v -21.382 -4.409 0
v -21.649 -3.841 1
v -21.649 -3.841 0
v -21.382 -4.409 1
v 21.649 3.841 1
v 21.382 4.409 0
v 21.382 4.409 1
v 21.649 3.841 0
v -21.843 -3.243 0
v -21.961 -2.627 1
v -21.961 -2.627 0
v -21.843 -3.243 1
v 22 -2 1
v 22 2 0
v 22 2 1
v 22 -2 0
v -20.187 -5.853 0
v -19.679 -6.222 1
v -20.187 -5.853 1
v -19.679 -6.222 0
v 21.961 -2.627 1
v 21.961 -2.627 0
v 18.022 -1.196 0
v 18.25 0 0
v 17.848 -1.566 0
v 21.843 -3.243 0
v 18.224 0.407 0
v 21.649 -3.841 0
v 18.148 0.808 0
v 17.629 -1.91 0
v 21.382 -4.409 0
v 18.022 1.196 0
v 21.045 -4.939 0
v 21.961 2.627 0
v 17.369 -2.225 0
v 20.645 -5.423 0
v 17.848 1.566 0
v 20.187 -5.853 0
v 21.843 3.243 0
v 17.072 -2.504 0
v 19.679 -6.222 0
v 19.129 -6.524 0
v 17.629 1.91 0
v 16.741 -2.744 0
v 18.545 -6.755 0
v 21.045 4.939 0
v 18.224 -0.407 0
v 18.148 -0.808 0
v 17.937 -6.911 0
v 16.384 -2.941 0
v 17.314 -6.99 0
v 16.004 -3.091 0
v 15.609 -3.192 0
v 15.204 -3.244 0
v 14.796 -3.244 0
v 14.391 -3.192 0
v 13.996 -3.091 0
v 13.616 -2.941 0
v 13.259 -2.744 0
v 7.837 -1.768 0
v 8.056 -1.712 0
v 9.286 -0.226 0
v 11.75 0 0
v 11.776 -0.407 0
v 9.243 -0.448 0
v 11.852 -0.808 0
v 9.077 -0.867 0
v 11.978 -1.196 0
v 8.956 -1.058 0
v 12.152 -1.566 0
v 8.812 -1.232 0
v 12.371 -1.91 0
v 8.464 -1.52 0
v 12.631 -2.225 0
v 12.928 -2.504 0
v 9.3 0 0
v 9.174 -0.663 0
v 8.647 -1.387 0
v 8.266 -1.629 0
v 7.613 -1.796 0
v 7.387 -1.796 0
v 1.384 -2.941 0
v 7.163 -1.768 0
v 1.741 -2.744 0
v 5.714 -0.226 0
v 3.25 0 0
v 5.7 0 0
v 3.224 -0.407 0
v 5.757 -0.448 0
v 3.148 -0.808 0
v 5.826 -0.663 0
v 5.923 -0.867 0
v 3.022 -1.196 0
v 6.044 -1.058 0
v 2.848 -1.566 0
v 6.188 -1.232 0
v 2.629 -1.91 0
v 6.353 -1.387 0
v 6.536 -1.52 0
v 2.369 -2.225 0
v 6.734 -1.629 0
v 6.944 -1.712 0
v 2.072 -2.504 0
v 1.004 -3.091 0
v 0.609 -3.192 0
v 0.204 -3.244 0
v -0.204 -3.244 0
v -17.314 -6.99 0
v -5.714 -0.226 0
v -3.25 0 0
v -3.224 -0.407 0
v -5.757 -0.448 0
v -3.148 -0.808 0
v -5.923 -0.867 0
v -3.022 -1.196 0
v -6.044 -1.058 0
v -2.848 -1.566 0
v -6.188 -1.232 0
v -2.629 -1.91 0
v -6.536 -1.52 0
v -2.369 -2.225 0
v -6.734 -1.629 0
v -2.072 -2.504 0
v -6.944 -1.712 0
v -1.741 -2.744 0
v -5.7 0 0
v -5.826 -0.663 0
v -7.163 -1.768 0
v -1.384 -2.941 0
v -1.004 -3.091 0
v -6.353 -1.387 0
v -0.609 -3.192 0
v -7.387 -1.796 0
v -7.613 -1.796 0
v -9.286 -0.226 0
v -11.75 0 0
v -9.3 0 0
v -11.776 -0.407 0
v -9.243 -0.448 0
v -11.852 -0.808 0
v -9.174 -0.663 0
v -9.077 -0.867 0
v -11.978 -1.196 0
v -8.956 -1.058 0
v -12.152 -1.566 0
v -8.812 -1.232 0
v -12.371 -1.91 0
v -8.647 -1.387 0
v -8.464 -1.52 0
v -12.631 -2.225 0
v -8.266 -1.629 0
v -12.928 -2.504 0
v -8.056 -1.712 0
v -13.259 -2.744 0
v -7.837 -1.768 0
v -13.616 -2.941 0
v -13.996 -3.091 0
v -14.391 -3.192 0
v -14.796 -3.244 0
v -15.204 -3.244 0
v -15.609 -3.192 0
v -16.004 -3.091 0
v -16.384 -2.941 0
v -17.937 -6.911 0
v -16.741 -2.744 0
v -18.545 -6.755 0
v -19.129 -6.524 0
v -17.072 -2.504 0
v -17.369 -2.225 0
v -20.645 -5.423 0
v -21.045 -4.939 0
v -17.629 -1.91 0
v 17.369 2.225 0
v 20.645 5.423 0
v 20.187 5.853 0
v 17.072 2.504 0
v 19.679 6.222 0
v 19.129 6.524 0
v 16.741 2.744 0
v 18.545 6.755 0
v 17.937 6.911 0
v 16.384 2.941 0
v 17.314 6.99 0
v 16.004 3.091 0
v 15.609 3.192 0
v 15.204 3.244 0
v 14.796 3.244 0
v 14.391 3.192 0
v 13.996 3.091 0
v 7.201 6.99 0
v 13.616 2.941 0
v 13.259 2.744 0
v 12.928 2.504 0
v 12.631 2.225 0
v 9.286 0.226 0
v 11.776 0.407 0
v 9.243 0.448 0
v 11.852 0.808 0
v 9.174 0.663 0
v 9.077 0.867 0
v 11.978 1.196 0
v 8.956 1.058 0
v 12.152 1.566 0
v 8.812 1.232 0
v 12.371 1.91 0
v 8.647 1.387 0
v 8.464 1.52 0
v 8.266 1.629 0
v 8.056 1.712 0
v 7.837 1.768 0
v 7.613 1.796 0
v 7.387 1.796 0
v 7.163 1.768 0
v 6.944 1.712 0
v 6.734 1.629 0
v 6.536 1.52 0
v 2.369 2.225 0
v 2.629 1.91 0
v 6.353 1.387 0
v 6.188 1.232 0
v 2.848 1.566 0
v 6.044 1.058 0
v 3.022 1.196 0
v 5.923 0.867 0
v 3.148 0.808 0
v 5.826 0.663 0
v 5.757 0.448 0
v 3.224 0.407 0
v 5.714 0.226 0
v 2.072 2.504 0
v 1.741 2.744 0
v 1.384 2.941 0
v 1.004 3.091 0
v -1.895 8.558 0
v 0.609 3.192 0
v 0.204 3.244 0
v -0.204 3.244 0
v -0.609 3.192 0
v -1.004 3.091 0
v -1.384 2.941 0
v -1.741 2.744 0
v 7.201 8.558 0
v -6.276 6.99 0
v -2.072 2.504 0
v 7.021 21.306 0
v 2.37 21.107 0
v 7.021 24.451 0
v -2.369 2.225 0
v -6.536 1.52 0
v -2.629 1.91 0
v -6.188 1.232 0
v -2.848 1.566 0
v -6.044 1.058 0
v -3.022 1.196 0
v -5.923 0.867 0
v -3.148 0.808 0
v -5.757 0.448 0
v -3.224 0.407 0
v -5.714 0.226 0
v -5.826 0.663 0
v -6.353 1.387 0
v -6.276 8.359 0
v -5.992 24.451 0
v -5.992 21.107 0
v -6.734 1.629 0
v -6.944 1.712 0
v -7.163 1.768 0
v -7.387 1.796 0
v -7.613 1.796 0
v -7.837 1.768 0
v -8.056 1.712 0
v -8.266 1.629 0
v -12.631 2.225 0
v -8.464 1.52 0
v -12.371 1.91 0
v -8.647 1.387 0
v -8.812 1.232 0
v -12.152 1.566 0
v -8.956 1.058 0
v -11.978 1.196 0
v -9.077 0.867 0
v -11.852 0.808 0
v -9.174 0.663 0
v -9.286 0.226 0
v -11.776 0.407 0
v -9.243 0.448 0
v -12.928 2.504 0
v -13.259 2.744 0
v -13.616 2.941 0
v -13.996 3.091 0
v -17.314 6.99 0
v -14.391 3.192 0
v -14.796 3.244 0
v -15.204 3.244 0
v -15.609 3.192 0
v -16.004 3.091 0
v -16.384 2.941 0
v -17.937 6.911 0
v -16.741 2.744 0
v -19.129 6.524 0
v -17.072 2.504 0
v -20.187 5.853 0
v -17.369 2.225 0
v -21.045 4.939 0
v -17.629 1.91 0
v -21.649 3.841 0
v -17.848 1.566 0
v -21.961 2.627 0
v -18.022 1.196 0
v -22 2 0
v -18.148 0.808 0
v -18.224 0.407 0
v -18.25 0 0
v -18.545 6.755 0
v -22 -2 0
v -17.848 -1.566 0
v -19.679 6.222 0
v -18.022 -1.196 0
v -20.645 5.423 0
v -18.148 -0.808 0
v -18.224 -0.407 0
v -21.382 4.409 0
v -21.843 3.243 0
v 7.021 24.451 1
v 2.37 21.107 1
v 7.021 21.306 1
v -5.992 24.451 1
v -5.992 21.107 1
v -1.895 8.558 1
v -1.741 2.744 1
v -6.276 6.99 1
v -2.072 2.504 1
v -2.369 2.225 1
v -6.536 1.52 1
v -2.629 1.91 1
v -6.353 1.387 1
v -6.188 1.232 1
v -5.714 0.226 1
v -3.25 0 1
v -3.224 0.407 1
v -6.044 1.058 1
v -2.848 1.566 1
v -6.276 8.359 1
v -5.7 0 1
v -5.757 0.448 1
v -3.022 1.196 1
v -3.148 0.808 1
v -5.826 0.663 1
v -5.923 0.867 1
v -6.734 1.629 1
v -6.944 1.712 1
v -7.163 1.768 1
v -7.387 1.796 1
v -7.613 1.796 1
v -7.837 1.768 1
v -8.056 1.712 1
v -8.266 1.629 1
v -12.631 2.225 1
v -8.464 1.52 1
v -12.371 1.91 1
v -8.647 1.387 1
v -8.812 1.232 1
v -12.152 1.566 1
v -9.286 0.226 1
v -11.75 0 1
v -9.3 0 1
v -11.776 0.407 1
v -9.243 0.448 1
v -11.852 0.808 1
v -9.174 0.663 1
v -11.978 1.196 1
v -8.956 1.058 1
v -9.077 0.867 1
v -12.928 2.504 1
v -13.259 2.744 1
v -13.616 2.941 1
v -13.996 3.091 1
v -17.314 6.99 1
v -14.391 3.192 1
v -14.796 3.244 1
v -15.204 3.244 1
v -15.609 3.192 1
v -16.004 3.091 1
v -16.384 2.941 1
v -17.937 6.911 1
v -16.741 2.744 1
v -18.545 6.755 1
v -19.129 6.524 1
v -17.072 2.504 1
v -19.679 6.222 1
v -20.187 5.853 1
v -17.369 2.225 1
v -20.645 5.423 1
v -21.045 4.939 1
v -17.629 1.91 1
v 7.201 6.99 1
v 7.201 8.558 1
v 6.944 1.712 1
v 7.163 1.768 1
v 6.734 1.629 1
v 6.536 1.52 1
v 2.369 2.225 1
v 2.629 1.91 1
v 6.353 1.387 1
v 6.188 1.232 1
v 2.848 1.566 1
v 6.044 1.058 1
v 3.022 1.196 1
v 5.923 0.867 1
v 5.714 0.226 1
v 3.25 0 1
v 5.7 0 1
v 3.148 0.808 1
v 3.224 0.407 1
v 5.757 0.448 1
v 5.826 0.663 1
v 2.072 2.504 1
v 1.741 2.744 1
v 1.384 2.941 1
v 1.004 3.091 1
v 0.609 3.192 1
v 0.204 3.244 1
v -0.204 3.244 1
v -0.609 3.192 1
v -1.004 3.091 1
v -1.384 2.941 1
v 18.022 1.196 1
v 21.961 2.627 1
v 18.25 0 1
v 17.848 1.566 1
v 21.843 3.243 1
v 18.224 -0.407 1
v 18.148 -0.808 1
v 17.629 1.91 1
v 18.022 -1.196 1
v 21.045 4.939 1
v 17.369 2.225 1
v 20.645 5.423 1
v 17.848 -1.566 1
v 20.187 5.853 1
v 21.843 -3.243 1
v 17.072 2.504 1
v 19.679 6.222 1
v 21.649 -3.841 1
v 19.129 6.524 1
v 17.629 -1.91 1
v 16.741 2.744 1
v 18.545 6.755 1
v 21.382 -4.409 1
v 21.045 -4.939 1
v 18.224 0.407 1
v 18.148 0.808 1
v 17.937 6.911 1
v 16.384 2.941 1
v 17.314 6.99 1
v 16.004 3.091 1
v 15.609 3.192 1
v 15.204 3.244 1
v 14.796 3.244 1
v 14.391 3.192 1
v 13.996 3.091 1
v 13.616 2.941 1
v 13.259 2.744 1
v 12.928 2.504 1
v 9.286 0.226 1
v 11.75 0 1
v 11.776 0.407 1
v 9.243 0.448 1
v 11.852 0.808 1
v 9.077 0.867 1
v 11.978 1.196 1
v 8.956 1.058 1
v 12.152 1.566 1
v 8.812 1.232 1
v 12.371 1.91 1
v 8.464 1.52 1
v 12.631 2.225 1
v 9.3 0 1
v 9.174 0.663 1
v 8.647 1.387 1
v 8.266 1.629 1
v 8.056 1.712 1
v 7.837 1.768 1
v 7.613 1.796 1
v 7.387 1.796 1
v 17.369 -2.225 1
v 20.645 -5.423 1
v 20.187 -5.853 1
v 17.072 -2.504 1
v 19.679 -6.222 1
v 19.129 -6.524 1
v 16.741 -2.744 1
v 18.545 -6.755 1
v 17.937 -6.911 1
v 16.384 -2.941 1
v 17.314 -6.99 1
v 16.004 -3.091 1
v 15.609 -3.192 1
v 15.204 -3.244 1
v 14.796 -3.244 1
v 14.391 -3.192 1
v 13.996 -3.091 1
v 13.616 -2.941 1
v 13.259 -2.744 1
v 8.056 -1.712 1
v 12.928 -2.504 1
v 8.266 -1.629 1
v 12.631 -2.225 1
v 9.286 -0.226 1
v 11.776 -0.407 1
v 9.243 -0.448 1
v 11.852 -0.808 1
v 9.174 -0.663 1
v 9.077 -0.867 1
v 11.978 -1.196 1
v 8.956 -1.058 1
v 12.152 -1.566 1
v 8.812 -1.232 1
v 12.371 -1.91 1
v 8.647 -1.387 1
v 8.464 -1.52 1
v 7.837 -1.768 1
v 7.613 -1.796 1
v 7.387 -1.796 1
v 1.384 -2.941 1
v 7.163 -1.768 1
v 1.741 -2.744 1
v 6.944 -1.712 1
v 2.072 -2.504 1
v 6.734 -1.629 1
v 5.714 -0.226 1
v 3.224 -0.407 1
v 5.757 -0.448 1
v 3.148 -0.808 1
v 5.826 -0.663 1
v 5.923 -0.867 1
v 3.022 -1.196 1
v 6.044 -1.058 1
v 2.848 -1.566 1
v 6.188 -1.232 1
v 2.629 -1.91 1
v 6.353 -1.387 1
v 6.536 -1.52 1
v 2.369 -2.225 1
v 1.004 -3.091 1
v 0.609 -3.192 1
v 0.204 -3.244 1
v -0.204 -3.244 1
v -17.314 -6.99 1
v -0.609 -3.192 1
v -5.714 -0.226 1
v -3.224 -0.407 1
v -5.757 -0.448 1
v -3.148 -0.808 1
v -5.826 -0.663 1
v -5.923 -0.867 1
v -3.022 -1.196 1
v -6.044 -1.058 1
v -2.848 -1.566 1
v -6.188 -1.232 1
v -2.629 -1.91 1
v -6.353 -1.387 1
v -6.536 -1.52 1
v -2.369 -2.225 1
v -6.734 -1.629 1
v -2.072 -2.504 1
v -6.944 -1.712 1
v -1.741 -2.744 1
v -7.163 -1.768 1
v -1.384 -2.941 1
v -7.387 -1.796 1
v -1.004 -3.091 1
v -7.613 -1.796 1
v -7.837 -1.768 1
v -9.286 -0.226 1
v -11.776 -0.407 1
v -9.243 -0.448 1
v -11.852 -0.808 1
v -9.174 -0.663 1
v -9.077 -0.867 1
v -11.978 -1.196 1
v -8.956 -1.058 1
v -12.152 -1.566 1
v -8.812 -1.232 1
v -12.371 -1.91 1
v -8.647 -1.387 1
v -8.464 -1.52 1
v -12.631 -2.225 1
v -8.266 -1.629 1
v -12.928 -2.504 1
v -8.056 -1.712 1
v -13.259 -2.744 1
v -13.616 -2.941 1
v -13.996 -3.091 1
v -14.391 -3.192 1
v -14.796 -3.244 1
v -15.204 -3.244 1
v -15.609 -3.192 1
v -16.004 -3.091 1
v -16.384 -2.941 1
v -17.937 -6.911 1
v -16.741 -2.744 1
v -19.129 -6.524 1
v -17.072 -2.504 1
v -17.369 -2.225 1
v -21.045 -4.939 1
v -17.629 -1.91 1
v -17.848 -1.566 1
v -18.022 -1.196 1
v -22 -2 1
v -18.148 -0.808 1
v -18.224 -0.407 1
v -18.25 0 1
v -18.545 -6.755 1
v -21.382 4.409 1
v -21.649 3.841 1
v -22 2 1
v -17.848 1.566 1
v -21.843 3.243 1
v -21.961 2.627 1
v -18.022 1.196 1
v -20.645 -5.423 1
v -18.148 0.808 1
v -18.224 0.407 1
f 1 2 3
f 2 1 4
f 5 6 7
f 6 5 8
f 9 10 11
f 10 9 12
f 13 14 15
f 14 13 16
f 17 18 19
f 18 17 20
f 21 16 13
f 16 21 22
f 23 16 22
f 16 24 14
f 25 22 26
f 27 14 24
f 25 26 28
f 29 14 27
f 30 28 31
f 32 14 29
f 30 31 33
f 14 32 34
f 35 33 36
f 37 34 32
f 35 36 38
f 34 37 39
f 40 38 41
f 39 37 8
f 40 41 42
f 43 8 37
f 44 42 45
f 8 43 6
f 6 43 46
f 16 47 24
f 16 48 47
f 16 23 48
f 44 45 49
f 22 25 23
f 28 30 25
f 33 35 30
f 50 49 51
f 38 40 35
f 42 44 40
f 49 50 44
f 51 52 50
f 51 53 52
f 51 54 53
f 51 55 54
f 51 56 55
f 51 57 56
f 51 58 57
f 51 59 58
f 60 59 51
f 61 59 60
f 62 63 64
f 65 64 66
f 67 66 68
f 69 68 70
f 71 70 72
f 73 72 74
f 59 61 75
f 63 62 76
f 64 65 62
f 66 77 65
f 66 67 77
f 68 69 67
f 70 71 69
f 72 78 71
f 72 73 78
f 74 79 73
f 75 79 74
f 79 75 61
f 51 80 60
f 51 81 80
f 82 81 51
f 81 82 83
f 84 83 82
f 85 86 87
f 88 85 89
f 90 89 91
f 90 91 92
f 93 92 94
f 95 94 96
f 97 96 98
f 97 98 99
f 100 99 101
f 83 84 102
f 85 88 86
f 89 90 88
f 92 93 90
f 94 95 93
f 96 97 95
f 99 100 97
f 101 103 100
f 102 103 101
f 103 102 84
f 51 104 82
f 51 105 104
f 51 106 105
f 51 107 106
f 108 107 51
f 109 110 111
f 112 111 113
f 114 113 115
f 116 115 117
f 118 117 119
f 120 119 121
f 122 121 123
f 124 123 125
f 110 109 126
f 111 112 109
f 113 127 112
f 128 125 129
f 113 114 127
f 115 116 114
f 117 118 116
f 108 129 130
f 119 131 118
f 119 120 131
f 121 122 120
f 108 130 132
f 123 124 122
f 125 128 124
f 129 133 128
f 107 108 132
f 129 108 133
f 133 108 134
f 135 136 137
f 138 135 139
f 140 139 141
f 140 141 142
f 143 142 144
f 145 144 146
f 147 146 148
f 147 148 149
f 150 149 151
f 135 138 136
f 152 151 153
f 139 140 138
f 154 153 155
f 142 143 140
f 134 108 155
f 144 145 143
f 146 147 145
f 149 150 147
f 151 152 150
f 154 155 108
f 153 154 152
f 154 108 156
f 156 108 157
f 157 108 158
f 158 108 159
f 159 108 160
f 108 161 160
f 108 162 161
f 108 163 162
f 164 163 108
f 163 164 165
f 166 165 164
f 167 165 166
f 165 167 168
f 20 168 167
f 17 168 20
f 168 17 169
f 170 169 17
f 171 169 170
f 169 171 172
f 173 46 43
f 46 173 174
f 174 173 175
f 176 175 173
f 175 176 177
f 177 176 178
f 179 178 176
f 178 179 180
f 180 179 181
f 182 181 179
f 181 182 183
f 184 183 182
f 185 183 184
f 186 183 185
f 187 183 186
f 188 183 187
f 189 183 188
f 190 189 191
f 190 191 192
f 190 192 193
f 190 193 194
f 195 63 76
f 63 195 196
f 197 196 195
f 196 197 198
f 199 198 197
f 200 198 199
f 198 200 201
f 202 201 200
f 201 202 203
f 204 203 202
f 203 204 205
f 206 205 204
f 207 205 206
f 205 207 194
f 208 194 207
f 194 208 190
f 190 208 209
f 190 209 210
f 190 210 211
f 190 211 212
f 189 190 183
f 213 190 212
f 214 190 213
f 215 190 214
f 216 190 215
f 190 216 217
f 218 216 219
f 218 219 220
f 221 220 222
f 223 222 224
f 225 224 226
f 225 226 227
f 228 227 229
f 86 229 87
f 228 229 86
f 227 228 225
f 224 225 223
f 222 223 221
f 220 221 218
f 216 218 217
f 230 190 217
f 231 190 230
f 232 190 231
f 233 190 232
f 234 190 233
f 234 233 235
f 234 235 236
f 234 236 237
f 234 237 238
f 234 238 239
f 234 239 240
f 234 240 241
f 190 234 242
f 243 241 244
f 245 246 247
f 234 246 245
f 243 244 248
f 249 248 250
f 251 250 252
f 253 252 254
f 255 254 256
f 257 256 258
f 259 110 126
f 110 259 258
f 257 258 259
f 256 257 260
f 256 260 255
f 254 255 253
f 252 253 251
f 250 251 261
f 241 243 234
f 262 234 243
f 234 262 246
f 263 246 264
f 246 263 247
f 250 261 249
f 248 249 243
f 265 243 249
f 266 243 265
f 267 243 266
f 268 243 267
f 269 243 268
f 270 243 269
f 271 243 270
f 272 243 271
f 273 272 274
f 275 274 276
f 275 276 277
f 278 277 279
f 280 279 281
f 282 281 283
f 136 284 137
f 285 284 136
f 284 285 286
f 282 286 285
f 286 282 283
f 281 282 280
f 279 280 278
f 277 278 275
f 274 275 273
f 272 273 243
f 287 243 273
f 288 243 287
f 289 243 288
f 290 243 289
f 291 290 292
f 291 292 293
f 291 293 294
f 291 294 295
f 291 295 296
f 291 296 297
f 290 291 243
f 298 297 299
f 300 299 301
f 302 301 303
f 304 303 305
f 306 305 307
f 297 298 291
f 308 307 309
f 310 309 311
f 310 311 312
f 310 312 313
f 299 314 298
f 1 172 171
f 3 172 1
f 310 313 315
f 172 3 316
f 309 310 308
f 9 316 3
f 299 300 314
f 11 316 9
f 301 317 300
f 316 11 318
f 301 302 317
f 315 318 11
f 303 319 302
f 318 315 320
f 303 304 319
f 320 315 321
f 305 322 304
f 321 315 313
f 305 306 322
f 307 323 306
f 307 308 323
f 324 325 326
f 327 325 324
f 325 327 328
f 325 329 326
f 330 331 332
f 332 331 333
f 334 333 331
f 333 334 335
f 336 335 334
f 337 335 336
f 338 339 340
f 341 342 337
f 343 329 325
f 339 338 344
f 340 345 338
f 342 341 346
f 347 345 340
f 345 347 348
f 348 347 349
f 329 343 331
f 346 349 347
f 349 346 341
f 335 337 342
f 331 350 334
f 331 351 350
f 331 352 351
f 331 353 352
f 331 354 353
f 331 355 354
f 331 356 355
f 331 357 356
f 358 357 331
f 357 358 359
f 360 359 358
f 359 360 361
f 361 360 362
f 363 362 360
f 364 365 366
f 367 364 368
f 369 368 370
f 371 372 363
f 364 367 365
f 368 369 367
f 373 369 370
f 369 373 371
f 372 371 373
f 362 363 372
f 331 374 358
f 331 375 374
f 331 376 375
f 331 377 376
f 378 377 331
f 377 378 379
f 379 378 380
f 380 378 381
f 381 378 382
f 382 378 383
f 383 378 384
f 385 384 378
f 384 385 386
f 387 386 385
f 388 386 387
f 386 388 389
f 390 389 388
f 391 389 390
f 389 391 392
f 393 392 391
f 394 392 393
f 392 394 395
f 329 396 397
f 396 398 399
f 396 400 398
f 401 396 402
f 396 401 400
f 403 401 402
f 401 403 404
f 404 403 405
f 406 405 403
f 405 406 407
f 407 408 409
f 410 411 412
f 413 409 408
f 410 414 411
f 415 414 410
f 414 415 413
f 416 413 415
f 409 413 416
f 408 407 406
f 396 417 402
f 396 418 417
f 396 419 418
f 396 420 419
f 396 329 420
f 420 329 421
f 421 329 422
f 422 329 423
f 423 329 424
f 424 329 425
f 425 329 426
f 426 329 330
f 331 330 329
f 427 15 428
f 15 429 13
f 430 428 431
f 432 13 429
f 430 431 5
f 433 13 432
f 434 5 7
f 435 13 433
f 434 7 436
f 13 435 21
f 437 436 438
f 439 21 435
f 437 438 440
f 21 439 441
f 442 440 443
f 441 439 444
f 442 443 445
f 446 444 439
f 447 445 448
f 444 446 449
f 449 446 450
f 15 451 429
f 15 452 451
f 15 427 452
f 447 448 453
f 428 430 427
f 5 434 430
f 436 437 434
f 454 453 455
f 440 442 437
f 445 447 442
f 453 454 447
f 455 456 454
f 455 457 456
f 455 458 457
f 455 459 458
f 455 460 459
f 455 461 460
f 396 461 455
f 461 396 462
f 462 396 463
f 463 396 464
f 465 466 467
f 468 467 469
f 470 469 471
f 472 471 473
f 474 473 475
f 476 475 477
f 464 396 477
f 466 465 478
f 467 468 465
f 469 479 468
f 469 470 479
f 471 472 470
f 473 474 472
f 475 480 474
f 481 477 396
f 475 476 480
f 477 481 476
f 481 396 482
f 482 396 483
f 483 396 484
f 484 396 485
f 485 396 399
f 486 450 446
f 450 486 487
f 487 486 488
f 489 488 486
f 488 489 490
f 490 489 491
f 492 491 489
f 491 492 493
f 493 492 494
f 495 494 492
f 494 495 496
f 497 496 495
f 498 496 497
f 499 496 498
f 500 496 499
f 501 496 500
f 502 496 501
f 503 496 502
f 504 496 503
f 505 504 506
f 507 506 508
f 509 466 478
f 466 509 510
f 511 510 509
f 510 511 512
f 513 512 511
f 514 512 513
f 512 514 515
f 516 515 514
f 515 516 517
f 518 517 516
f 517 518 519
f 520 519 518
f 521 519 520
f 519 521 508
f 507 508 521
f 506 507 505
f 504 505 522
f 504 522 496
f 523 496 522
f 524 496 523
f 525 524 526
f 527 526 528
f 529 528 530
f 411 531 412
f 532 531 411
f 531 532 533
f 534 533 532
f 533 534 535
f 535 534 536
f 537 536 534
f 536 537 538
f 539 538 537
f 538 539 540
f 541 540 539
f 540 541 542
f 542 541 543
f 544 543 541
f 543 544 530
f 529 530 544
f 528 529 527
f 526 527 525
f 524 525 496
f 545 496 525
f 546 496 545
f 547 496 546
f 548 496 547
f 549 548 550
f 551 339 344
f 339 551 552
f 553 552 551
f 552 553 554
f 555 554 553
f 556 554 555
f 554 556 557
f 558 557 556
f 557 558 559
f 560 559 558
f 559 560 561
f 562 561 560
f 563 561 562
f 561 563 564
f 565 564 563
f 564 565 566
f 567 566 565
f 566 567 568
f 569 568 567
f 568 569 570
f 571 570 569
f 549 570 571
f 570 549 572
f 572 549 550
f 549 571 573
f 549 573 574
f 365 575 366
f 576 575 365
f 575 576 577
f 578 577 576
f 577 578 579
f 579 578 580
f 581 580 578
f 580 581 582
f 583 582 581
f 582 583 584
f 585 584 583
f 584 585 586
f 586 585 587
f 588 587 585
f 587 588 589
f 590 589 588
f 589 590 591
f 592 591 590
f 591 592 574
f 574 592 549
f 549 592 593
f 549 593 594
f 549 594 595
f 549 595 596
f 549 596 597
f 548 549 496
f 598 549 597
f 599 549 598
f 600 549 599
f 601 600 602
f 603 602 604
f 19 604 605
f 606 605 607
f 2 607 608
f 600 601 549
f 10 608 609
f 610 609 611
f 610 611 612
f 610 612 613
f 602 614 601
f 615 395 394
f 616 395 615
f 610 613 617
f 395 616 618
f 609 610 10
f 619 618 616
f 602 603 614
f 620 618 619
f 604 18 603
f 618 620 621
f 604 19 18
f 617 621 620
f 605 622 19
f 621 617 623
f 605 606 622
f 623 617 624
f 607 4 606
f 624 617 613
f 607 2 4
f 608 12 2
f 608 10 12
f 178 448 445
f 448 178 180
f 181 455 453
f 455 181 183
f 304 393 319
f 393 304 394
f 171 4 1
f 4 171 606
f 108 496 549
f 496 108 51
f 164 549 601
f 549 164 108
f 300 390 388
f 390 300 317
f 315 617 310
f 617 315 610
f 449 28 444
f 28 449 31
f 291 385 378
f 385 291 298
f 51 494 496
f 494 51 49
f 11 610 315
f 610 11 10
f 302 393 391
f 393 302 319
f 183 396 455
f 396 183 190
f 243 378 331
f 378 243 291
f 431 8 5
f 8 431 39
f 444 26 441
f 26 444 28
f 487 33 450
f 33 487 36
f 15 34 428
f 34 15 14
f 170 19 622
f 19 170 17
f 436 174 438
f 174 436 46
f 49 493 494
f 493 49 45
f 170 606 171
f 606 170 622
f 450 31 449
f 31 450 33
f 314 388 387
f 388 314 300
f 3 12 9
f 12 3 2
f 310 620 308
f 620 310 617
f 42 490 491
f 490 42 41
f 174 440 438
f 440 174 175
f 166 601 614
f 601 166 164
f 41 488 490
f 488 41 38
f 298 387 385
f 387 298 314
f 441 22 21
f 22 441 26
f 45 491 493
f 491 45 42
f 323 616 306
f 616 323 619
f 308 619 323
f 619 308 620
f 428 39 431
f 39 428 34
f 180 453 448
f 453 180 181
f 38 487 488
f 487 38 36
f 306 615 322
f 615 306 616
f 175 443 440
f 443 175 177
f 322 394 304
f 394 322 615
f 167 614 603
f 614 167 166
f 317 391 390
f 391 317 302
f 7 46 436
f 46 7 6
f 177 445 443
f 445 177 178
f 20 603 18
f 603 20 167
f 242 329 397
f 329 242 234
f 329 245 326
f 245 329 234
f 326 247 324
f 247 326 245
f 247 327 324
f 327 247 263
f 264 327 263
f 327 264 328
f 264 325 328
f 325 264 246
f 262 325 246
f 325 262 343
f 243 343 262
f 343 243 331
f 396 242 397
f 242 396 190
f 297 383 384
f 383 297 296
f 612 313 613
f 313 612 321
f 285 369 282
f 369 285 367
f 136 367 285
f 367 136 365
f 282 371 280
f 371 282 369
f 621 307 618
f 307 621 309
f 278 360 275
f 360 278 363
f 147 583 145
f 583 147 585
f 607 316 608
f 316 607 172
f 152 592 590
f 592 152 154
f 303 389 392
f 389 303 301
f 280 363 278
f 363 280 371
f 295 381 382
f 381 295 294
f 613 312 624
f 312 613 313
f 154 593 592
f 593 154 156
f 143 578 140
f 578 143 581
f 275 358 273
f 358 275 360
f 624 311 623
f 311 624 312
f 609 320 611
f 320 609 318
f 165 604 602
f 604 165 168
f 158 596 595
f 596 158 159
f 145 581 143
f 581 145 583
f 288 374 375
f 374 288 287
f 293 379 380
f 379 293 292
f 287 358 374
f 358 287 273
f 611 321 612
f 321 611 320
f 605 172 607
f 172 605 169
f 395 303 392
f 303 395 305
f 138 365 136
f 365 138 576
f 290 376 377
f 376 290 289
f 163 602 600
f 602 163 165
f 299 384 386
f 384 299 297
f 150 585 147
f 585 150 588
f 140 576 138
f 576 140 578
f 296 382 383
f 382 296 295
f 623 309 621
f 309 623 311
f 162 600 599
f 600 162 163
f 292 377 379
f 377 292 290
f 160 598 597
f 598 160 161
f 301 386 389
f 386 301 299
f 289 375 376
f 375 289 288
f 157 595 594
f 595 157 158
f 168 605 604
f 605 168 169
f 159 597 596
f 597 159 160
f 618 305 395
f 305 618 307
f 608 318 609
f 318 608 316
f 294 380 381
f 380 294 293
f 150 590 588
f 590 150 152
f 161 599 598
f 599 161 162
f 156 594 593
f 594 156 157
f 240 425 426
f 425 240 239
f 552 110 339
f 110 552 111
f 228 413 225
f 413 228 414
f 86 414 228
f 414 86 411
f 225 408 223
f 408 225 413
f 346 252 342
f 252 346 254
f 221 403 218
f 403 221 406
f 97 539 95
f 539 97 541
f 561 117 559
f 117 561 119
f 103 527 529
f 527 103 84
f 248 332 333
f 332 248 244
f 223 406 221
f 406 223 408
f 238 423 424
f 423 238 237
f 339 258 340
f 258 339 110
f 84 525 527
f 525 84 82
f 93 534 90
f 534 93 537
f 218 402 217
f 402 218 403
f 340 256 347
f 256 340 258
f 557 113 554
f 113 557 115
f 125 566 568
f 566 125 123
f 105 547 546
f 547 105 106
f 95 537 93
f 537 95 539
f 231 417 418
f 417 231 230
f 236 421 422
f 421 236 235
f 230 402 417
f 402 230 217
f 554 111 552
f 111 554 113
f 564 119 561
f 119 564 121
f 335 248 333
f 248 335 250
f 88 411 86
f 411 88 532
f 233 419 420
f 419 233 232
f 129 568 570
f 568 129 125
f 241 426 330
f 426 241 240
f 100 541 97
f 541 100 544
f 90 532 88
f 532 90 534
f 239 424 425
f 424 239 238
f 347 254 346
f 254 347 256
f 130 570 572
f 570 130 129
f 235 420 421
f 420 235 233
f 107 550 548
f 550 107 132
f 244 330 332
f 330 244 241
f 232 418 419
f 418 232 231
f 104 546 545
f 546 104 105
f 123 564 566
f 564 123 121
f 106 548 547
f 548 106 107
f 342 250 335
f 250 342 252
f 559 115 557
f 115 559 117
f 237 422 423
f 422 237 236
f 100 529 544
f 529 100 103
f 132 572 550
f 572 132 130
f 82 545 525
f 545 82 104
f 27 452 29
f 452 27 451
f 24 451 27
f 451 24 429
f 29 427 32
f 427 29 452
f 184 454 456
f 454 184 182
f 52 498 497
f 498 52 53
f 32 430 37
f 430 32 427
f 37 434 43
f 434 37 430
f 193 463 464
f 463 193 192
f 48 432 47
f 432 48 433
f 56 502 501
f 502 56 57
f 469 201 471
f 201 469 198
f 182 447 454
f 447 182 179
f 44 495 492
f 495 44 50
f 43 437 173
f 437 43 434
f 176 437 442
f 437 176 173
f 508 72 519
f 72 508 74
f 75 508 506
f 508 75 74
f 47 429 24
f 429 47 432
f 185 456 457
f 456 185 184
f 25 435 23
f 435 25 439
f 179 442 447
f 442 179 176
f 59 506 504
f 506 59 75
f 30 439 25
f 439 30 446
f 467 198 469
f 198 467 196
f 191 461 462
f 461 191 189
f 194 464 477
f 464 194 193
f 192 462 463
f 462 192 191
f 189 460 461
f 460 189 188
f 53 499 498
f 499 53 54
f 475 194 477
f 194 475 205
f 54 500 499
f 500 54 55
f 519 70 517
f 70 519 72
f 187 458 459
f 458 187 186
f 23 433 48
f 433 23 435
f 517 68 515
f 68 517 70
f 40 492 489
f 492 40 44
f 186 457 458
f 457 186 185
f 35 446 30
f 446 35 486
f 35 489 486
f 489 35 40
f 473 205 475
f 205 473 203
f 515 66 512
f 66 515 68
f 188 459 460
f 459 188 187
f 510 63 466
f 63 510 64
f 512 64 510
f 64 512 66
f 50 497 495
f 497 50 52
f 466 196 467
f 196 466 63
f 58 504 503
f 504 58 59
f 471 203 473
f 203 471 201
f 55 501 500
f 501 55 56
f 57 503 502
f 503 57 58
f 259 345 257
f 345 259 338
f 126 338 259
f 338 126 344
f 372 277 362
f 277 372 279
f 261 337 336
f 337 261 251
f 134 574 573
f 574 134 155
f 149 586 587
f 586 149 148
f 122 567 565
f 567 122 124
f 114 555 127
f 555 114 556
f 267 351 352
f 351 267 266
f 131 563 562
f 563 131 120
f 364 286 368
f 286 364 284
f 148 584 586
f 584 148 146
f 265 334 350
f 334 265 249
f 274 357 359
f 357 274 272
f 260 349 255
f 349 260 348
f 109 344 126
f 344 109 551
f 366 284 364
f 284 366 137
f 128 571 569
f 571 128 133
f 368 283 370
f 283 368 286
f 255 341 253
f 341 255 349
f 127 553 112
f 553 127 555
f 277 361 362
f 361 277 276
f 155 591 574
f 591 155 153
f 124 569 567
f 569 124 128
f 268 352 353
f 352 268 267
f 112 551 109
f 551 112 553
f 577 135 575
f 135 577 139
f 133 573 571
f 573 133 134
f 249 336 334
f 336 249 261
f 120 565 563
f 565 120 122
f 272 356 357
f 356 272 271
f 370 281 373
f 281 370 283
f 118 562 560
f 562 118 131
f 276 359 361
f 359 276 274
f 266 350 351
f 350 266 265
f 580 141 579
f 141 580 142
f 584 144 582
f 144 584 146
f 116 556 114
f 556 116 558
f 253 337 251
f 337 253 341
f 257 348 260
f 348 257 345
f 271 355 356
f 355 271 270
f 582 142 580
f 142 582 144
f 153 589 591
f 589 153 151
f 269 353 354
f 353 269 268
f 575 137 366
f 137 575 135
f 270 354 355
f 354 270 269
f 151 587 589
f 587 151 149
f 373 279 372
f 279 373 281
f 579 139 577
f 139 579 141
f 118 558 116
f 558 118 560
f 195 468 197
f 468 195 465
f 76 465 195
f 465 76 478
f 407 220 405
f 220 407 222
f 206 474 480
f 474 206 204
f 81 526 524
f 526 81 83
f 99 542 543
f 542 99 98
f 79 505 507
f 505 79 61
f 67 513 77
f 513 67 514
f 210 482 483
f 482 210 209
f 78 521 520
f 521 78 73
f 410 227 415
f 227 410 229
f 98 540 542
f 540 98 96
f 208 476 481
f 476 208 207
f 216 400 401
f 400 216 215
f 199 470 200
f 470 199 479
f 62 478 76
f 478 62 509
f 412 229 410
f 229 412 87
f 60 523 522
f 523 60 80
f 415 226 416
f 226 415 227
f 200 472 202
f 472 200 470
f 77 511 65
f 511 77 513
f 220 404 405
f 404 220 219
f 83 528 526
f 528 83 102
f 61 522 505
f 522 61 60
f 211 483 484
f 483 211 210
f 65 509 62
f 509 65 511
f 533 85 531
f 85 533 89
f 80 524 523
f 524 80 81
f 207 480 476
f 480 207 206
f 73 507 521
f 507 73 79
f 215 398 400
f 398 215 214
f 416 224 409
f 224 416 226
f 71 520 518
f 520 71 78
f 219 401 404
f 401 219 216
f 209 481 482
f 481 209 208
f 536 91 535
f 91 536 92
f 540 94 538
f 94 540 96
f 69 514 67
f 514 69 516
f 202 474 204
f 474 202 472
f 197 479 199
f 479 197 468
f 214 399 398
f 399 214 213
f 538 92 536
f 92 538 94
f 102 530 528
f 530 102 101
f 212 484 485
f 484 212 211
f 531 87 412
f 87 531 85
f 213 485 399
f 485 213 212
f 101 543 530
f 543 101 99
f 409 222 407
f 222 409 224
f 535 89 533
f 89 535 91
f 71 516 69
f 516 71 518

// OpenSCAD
$fn = 50;


difference() {
	union() {
		hull() {
			translate(v = [-17.0000000000, 2.0000000000, 0]) {
				cylinder(h = 1, r = 5);
			}
			translate(v = [17.0000000000, 2.0000000000, 0]) {
				cylinder(h = 1, r = 5);
			}
			translate(v = [-17.0000000000, -2.0000000000, 0]) {
				cylinder(h = 1, r = 5);
			}
			translate(v = [17.0000000000, -2.0000000000, 0]) {
				cylinder(h = 1, r = 5);
			}
		}
		translate(v = [0, 24, 0]) {
			linear_extrude(height = 1) {
				text(font = "DejaVu Sans Mono:style=Bold", halign = "center", size = 19.0000000000, text = "Z", valign = "top");
			}
		}
	}
	union() {
		translate(v = [-15.0000000000, 0.0000000000, 0]) {
			translate(v = [0, 0, -100]) {
				cylinder(h = 200, r = 3.2500000000);
			}
		}
		translate(v = [0, 0, -100]) {
			cylinder(h = 200, r = 3.2500000000);
		}
		translate(v = [15.0000000000, 0.0000000000, 0]) {
			translate(v = [0, 0, -100]) {
				cylinder(h = 200, r = 3.2500000000);
			}
		}
		translate(v = [-15.0000000000, 0.0000000000, 0]) {
			translate(v = [0, 0, -100]) {
				cylinder(h = 200, r = 1.8000000000);
			}
		}
		translate(v = [-7.5000000000, 0.0000000000, 0]) {
			translate(v = [0, 0, -100]) {
				cylinder(h = 200, r = 1.8000000000);
			}
		}
		translate(v = [0, 0, -100]) {
			cylinder(h = 200, r = 1.8000000000);
		}
		translate(v = [7.5000000000, 0.0000000000, 0]) {
			translate(v = [0, 0, -100]) {
				cylinder(h = 200, r = 1.8000000000);
			}
		}
		translate(v = [15.0000000000, 0.0000000000, 0]) {
			translate(v = [0, 0, -100]) {
				cylinder(h = 200, r = 1.8000000000);
			}
		}
	}
}
